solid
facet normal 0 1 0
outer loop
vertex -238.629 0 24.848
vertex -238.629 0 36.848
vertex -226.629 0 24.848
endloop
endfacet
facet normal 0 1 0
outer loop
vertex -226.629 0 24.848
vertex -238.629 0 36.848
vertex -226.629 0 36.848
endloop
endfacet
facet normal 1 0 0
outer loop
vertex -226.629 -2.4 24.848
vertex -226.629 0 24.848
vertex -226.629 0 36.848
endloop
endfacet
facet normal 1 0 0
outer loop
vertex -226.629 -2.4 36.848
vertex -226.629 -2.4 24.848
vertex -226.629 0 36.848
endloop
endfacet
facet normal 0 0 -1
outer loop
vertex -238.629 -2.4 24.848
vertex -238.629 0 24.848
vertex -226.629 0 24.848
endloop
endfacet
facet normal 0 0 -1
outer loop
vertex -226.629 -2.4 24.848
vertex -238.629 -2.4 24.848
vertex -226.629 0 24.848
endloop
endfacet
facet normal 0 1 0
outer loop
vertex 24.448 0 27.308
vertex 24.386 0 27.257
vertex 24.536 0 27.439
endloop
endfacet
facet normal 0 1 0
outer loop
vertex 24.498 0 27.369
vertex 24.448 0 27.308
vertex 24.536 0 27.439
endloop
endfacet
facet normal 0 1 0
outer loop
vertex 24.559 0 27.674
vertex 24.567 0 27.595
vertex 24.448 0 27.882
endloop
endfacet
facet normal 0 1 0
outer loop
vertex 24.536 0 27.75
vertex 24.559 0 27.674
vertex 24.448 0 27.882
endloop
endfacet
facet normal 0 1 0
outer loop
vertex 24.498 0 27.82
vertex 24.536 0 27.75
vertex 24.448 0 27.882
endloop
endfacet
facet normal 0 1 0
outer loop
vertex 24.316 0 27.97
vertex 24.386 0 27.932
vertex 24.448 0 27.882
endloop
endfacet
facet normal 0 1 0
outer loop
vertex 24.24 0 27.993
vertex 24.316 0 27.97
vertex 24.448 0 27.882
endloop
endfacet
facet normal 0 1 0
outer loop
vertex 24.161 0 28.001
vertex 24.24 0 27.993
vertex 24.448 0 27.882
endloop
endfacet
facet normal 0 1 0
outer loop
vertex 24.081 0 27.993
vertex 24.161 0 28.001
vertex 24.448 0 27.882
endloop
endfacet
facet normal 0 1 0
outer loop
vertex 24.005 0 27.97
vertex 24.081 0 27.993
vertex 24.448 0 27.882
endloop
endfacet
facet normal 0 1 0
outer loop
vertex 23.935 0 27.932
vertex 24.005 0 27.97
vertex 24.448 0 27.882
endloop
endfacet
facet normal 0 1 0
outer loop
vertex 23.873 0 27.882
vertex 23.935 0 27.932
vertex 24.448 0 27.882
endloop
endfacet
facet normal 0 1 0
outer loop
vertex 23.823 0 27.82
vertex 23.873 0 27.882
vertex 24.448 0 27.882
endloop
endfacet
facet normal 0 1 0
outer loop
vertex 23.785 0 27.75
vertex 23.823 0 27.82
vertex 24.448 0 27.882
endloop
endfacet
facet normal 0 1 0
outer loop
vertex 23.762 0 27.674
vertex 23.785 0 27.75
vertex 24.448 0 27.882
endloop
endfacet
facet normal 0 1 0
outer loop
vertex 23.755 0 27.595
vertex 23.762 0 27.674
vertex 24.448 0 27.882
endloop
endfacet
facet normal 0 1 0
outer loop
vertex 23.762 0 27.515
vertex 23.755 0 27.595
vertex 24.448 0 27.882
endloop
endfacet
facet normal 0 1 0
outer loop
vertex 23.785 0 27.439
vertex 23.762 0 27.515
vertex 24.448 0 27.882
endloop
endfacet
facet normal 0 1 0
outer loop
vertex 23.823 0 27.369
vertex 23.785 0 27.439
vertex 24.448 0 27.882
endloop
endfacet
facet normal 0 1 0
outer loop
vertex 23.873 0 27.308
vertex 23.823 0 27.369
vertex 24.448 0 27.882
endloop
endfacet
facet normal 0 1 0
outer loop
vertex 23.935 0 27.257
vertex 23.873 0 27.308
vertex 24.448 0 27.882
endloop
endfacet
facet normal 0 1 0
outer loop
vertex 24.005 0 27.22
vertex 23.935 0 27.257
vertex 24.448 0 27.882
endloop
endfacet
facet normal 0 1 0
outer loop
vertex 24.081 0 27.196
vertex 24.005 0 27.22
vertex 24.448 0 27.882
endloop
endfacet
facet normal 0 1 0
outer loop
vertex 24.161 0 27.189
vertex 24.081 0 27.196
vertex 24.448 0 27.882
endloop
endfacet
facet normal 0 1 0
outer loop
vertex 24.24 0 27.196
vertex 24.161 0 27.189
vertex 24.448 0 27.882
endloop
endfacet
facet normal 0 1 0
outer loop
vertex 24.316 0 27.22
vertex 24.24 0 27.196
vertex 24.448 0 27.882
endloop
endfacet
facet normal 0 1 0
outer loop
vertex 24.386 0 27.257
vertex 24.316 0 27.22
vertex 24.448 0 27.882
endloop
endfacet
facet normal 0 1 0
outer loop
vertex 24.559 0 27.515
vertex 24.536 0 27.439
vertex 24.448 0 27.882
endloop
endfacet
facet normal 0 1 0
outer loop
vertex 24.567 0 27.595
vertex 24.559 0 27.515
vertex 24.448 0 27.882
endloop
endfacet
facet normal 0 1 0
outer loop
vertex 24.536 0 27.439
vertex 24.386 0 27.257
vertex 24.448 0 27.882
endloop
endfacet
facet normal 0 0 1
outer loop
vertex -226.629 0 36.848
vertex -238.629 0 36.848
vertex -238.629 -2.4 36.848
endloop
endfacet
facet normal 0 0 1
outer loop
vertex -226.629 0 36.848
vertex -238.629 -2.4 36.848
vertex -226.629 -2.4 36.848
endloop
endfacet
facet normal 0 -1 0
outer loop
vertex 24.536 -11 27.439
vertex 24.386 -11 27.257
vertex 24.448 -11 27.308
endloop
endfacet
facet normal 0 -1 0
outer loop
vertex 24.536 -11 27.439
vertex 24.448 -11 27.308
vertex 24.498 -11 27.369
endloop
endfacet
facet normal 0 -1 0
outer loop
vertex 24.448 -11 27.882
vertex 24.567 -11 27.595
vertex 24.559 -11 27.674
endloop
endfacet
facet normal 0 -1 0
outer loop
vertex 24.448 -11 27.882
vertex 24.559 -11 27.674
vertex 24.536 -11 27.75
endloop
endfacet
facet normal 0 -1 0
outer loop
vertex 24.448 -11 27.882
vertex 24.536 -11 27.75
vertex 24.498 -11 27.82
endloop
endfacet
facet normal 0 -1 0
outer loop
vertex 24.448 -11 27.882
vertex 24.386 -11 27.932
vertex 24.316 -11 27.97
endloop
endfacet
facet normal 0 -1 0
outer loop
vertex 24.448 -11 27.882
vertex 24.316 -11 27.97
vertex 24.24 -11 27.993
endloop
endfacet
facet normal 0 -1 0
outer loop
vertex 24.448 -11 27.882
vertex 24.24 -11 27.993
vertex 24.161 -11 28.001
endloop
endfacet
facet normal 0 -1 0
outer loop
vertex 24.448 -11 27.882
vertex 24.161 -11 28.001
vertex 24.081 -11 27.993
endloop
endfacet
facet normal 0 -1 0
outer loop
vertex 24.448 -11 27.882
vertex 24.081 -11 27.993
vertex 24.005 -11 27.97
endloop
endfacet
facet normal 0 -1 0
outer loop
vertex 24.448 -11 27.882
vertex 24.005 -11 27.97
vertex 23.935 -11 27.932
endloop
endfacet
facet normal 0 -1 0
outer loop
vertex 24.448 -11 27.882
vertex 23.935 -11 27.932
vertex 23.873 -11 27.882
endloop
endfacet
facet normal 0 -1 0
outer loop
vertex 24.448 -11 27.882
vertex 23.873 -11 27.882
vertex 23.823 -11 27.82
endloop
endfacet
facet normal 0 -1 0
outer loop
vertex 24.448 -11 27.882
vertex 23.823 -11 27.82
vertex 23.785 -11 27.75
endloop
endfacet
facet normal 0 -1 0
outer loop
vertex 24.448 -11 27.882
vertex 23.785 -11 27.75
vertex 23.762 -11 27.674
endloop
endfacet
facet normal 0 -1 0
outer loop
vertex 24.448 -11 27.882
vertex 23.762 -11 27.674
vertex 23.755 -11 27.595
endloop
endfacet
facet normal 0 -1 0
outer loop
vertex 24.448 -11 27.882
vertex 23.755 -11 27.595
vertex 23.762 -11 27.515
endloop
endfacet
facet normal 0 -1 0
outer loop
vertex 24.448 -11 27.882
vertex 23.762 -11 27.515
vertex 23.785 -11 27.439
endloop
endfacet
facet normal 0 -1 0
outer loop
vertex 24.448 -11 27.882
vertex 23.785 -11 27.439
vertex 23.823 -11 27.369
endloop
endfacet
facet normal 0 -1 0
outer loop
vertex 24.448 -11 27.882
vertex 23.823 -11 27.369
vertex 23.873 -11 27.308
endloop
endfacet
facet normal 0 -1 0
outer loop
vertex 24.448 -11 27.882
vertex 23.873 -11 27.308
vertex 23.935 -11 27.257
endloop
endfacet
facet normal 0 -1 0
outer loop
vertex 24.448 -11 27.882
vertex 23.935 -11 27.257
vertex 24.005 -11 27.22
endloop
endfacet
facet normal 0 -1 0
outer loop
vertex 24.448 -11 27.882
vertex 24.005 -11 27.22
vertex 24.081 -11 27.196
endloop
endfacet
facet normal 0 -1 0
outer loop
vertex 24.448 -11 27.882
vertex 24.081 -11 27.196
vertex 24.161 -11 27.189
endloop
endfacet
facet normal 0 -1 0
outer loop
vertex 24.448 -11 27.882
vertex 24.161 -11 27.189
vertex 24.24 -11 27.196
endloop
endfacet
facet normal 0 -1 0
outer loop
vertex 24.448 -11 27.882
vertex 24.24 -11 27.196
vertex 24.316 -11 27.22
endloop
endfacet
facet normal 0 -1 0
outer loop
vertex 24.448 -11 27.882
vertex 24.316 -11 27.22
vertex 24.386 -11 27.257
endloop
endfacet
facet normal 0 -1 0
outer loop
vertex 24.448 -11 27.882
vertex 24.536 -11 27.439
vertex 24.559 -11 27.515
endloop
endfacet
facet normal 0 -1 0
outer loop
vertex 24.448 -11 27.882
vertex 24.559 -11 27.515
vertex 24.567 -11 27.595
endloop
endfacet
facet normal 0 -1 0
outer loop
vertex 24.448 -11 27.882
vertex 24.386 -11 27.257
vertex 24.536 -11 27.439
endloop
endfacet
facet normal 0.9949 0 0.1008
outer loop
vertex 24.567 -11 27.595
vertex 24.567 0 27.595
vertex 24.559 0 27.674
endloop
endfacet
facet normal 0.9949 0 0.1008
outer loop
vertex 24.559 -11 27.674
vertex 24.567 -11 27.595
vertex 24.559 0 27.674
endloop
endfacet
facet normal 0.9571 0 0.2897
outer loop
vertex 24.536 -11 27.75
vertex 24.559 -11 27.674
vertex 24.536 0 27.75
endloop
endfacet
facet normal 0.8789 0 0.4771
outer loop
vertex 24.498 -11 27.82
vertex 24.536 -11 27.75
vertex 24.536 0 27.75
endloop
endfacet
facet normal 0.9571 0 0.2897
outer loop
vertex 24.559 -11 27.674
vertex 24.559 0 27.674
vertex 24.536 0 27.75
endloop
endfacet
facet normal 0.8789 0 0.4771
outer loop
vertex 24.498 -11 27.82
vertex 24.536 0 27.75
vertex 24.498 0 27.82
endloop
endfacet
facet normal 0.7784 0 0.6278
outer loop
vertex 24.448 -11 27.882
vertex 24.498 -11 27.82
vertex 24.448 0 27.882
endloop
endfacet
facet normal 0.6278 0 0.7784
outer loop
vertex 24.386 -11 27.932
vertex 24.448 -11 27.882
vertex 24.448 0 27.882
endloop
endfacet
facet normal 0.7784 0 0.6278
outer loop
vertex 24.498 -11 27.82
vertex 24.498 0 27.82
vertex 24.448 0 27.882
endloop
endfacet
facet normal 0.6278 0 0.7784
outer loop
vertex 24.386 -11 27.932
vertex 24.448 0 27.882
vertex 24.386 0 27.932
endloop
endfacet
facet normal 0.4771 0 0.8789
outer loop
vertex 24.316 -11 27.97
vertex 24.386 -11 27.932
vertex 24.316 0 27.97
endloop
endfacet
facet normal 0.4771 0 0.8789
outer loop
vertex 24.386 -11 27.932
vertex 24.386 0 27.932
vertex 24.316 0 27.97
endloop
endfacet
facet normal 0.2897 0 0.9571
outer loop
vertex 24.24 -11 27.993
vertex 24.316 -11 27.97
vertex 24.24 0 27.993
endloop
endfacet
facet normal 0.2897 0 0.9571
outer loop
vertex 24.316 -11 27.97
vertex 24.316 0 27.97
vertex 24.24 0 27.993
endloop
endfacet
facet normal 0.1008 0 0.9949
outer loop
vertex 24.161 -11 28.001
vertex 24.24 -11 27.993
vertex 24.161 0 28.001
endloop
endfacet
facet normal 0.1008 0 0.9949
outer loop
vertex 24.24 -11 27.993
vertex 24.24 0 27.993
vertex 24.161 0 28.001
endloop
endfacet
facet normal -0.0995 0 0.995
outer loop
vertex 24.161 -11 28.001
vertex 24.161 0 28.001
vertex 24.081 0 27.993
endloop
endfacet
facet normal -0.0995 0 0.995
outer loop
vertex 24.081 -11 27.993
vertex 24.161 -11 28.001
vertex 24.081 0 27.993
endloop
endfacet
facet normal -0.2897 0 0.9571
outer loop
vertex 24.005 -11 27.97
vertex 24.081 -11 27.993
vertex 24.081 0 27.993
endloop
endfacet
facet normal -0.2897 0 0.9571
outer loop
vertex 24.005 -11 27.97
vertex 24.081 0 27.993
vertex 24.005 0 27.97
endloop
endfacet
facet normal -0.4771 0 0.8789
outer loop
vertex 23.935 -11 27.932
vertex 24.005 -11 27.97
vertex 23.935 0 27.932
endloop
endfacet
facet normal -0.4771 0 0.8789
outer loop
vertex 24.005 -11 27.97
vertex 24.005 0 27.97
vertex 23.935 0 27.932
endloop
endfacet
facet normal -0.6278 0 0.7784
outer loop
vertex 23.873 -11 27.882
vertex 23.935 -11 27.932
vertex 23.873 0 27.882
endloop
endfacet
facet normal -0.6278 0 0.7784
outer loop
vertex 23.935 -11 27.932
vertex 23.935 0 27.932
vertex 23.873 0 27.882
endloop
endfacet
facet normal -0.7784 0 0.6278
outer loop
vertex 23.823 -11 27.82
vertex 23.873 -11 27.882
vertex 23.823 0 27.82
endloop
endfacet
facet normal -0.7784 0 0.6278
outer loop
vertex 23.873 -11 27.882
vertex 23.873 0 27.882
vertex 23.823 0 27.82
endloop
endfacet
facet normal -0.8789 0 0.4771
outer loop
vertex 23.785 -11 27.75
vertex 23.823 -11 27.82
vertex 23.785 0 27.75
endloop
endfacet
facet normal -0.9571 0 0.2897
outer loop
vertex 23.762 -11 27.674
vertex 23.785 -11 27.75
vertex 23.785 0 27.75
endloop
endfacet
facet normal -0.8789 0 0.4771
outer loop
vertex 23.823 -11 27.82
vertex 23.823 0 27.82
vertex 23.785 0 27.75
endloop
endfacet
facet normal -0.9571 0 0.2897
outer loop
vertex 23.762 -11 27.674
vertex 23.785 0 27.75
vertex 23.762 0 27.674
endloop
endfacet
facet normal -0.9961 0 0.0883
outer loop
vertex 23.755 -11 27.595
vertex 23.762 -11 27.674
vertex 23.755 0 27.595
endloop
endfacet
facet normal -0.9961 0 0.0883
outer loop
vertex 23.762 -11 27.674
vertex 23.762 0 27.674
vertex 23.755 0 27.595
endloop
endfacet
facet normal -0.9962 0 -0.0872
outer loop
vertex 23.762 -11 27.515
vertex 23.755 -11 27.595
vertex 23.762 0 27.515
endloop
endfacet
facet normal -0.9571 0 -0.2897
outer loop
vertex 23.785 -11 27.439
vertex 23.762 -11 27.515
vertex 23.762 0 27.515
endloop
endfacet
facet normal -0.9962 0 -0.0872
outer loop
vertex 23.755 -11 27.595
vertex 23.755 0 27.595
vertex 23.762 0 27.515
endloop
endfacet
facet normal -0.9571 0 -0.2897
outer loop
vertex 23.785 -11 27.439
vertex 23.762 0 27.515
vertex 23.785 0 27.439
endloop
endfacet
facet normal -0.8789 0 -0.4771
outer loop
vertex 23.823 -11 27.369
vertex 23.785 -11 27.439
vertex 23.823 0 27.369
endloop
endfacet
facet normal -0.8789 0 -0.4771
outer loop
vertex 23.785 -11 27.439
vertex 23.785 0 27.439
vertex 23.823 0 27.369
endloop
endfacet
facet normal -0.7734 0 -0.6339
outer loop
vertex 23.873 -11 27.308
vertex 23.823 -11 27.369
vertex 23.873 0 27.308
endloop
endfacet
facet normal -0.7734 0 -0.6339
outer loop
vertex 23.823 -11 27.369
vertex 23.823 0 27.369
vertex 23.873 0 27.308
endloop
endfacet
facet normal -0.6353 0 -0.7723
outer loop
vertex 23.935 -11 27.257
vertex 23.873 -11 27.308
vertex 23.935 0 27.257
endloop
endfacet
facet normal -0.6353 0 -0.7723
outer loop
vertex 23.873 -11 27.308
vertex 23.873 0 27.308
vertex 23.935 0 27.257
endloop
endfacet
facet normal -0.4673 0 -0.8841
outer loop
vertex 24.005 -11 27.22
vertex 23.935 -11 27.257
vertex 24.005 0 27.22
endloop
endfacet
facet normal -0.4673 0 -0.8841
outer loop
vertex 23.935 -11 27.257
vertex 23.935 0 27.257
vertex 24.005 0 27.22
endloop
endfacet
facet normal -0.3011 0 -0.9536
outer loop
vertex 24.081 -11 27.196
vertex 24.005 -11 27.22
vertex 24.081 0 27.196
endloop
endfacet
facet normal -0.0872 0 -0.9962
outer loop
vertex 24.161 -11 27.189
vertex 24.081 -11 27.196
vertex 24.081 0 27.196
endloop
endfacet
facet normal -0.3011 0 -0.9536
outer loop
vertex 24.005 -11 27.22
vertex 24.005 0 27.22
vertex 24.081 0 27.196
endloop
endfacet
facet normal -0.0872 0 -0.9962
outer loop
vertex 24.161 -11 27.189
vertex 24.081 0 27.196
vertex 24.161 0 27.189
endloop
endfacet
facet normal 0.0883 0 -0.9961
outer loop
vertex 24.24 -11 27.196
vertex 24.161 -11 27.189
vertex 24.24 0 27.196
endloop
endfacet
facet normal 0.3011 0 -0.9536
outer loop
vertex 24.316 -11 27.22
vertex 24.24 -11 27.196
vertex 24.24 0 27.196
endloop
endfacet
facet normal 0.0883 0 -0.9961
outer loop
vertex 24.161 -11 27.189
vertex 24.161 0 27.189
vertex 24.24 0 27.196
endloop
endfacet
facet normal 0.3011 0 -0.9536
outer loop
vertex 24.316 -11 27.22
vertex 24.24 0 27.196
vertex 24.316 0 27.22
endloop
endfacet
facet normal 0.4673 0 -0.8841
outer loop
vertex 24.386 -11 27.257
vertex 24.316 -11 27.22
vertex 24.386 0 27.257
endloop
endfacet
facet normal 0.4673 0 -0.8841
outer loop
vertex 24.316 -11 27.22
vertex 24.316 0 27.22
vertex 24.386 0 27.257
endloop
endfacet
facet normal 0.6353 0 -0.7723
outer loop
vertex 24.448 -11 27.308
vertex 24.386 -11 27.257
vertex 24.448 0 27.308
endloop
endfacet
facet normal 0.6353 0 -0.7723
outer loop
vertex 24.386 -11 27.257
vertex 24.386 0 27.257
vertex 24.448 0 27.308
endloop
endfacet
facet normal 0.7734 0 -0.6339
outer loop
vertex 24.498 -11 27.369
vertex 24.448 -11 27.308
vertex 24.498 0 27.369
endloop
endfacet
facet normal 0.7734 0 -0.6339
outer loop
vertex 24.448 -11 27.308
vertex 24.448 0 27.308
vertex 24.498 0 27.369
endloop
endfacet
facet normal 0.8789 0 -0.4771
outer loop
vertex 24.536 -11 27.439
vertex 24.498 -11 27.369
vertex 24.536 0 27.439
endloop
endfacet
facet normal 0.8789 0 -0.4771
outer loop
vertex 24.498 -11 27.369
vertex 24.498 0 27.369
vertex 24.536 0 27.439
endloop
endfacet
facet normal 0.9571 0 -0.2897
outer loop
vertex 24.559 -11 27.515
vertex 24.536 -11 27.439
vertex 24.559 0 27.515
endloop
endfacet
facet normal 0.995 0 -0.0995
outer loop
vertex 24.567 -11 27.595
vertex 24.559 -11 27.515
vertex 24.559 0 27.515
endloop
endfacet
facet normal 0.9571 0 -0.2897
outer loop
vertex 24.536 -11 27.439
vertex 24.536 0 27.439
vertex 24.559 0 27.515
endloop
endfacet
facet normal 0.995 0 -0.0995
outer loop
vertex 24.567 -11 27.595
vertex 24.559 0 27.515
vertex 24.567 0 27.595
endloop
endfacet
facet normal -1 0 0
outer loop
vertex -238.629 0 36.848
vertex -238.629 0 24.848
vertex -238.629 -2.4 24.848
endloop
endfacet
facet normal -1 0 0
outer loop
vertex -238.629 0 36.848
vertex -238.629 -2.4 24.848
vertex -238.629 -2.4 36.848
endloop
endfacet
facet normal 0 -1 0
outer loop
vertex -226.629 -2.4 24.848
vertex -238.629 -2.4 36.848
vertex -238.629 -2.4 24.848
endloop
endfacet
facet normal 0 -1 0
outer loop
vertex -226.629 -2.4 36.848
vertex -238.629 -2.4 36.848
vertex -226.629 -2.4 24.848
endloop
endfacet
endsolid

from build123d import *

# Parameters (mm, degrees)
F0_R     = 0.406
F1_DEPTH = 11
F2_W     = 12
F2_H     = 12
F3_DEPTH = 2.4


with BuildPart() as f1:
    # F0 (on Front) → F1 (new body)
    with BuildSketch(Plane.XZ):
        with Locations((24.160525, 27.594596)):
            Circle(F0_R)
    extrude(amount=F1_DEPTH)


with BuildPart() as f3:
    # F2 (on Front) → F3 (new body)
    with BuildSketch(Plane.XZ):
        with Locations((-232.629019, 30.84787)):
            Rectangle(F2_W, F2_H)
    extrude(amount=F3_DEPTH)


solid = Compound([f1.part, f3.part])
